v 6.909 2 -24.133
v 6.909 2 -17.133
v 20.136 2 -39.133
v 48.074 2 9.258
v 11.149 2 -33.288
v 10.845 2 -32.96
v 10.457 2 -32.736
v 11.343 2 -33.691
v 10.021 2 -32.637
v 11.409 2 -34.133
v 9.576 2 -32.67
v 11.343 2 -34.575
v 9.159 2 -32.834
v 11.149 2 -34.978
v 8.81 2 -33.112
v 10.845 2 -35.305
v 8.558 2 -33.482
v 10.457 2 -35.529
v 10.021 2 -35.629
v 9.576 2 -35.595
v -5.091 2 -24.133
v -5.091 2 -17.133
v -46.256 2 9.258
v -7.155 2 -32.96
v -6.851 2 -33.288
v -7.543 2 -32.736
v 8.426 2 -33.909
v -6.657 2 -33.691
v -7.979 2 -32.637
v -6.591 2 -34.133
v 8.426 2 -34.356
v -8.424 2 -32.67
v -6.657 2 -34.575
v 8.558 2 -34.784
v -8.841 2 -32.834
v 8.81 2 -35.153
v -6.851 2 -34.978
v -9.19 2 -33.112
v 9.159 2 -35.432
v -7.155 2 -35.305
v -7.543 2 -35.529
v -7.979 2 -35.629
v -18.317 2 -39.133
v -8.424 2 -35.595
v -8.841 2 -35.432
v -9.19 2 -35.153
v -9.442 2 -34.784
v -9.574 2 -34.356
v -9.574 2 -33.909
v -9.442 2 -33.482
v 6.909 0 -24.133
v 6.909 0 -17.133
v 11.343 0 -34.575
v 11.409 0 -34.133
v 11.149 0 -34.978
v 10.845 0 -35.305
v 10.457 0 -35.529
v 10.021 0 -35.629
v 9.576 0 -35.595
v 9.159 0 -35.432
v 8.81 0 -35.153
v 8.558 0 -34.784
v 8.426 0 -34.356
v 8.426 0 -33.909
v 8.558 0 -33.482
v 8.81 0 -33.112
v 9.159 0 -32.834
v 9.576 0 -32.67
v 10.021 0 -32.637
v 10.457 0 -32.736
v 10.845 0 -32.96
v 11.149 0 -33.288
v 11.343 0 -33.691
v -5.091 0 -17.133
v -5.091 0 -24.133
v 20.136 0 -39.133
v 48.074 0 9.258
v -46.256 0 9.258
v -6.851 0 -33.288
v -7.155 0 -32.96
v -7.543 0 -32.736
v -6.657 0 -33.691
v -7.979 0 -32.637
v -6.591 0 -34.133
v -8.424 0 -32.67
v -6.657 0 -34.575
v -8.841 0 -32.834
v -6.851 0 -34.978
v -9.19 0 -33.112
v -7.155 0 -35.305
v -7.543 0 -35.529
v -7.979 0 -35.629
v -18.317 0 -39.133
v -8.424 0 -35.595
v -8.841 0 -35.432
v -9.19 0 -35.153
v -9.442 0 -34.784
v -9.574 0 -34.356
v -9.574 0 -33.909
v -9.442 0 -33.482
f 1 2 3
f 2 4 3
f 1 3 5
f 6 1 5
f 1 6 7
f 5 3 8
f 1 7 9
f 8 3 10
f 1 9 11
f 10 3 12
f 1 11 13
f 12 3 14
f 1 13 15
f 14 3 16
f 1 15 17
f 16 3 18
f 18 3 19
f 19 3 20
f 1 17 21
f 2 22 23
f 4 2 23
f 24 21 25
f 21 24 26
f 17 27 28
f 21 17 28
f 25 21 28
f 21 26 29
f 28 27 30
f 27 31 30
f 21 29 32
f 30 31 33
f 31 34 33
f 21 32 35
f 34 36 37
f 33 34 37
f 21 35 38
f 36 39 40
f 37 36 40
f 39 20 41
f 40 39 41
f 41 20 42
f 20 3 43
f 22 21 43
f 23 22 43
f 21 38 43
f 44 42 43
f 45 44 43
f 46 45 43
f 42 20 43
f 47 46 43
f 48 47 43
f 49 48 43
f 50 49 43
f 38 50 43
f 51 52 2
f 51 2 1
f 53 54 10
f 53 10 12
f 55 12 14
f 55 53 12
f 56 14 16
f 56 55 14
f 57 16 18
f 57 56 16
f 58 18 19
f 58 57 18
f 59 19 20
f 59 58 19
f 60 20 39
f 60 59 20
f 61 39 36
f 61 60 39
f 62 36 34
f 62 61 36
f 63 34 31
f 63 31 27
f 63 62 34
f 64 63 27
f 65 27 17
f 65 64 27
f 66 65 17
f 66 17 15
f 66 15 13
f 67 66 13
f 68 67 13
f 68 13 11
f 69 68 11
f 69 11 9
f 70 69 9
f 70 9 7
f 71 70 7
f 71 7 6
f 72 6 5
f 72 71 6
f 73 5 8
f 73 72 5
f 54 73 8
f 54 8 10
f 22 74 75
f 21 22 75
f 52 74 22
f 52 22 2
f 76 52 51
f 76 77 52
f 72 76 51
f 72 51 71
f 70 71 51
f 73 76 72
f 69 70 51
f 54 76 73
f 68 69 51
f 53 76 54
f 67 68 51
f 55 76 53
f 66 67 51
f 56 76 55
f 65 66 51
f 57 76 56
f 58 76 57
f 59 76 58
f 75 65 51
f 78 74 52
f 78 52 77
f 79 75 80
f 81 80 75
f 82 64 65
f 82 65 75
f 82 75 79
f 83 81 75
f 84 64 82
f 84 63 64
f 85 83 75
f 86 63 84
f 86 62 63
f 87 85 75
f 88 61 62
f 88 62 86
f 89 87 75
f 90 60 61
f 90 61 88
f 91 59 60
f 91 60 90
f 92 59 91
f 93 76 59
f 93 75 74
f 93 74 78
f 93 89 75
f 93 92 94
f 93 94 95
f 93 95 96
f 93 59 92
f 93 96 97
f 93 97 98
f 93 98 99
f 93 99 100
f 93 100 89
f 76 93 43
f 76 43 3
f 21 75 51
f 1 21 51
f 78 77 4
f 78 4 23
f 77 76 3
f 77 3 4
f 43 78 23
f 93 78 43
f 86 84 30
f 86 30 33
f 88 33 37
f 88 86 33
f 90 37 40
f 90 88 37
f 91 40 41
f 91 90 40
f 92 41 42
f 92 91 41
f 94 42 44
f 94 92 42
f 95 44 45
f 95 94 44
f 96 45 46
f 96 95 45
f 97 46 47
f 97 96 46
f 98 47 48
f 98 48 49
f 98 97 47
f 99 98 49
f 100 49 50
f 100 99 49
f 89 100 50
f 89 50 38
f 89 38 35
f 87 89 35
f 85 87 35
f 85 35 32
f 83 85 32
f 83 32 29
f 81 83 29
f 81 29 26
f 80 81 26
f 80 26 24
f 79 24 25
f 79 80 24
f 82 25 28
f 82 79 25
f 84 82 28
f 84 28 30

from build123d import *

# Parameters (mm, degrees)
ESQUISSE1_R        = 1.5
ESQUISSE1_W        = 12
ESQUISSE1_H        = 7
BOSS_EXTRU_1_DEPTH = 2


with BuildPart() as part:
    # Esquisse1 → Boss.-Extru.1 (new body)
    with BuildSketch(Plane(origin=(0, 0, 0), x_dir=(1, 0, 0), z_dir=(0, 1, 0))):
        Polygon((-18.31712618, 39.132721947), (20.135868436, 39.132721947), (48.074434638, -9.258294204), (-46.255692381, -9.258294204), align=None)
        with Locations((-8.090628872, 34.132721947)):
            Circle(ESQUISSE1_R, mode=Mode.SUBTRACT)
        with Locations((9.909371128, 34.132721947)):
            Circle(ESQUISSE1_R, mode=Mode.SUBTRACT)
        with Locations((0.909371128, 20.632721947)):
            Rectangle(ESQUISSE1_W, ESQUISSE1_H, mode=Mode.SUBTRACT)
    extrude(amount=BOSS_EXTRU_1_DEPTH)


solid = part.part
